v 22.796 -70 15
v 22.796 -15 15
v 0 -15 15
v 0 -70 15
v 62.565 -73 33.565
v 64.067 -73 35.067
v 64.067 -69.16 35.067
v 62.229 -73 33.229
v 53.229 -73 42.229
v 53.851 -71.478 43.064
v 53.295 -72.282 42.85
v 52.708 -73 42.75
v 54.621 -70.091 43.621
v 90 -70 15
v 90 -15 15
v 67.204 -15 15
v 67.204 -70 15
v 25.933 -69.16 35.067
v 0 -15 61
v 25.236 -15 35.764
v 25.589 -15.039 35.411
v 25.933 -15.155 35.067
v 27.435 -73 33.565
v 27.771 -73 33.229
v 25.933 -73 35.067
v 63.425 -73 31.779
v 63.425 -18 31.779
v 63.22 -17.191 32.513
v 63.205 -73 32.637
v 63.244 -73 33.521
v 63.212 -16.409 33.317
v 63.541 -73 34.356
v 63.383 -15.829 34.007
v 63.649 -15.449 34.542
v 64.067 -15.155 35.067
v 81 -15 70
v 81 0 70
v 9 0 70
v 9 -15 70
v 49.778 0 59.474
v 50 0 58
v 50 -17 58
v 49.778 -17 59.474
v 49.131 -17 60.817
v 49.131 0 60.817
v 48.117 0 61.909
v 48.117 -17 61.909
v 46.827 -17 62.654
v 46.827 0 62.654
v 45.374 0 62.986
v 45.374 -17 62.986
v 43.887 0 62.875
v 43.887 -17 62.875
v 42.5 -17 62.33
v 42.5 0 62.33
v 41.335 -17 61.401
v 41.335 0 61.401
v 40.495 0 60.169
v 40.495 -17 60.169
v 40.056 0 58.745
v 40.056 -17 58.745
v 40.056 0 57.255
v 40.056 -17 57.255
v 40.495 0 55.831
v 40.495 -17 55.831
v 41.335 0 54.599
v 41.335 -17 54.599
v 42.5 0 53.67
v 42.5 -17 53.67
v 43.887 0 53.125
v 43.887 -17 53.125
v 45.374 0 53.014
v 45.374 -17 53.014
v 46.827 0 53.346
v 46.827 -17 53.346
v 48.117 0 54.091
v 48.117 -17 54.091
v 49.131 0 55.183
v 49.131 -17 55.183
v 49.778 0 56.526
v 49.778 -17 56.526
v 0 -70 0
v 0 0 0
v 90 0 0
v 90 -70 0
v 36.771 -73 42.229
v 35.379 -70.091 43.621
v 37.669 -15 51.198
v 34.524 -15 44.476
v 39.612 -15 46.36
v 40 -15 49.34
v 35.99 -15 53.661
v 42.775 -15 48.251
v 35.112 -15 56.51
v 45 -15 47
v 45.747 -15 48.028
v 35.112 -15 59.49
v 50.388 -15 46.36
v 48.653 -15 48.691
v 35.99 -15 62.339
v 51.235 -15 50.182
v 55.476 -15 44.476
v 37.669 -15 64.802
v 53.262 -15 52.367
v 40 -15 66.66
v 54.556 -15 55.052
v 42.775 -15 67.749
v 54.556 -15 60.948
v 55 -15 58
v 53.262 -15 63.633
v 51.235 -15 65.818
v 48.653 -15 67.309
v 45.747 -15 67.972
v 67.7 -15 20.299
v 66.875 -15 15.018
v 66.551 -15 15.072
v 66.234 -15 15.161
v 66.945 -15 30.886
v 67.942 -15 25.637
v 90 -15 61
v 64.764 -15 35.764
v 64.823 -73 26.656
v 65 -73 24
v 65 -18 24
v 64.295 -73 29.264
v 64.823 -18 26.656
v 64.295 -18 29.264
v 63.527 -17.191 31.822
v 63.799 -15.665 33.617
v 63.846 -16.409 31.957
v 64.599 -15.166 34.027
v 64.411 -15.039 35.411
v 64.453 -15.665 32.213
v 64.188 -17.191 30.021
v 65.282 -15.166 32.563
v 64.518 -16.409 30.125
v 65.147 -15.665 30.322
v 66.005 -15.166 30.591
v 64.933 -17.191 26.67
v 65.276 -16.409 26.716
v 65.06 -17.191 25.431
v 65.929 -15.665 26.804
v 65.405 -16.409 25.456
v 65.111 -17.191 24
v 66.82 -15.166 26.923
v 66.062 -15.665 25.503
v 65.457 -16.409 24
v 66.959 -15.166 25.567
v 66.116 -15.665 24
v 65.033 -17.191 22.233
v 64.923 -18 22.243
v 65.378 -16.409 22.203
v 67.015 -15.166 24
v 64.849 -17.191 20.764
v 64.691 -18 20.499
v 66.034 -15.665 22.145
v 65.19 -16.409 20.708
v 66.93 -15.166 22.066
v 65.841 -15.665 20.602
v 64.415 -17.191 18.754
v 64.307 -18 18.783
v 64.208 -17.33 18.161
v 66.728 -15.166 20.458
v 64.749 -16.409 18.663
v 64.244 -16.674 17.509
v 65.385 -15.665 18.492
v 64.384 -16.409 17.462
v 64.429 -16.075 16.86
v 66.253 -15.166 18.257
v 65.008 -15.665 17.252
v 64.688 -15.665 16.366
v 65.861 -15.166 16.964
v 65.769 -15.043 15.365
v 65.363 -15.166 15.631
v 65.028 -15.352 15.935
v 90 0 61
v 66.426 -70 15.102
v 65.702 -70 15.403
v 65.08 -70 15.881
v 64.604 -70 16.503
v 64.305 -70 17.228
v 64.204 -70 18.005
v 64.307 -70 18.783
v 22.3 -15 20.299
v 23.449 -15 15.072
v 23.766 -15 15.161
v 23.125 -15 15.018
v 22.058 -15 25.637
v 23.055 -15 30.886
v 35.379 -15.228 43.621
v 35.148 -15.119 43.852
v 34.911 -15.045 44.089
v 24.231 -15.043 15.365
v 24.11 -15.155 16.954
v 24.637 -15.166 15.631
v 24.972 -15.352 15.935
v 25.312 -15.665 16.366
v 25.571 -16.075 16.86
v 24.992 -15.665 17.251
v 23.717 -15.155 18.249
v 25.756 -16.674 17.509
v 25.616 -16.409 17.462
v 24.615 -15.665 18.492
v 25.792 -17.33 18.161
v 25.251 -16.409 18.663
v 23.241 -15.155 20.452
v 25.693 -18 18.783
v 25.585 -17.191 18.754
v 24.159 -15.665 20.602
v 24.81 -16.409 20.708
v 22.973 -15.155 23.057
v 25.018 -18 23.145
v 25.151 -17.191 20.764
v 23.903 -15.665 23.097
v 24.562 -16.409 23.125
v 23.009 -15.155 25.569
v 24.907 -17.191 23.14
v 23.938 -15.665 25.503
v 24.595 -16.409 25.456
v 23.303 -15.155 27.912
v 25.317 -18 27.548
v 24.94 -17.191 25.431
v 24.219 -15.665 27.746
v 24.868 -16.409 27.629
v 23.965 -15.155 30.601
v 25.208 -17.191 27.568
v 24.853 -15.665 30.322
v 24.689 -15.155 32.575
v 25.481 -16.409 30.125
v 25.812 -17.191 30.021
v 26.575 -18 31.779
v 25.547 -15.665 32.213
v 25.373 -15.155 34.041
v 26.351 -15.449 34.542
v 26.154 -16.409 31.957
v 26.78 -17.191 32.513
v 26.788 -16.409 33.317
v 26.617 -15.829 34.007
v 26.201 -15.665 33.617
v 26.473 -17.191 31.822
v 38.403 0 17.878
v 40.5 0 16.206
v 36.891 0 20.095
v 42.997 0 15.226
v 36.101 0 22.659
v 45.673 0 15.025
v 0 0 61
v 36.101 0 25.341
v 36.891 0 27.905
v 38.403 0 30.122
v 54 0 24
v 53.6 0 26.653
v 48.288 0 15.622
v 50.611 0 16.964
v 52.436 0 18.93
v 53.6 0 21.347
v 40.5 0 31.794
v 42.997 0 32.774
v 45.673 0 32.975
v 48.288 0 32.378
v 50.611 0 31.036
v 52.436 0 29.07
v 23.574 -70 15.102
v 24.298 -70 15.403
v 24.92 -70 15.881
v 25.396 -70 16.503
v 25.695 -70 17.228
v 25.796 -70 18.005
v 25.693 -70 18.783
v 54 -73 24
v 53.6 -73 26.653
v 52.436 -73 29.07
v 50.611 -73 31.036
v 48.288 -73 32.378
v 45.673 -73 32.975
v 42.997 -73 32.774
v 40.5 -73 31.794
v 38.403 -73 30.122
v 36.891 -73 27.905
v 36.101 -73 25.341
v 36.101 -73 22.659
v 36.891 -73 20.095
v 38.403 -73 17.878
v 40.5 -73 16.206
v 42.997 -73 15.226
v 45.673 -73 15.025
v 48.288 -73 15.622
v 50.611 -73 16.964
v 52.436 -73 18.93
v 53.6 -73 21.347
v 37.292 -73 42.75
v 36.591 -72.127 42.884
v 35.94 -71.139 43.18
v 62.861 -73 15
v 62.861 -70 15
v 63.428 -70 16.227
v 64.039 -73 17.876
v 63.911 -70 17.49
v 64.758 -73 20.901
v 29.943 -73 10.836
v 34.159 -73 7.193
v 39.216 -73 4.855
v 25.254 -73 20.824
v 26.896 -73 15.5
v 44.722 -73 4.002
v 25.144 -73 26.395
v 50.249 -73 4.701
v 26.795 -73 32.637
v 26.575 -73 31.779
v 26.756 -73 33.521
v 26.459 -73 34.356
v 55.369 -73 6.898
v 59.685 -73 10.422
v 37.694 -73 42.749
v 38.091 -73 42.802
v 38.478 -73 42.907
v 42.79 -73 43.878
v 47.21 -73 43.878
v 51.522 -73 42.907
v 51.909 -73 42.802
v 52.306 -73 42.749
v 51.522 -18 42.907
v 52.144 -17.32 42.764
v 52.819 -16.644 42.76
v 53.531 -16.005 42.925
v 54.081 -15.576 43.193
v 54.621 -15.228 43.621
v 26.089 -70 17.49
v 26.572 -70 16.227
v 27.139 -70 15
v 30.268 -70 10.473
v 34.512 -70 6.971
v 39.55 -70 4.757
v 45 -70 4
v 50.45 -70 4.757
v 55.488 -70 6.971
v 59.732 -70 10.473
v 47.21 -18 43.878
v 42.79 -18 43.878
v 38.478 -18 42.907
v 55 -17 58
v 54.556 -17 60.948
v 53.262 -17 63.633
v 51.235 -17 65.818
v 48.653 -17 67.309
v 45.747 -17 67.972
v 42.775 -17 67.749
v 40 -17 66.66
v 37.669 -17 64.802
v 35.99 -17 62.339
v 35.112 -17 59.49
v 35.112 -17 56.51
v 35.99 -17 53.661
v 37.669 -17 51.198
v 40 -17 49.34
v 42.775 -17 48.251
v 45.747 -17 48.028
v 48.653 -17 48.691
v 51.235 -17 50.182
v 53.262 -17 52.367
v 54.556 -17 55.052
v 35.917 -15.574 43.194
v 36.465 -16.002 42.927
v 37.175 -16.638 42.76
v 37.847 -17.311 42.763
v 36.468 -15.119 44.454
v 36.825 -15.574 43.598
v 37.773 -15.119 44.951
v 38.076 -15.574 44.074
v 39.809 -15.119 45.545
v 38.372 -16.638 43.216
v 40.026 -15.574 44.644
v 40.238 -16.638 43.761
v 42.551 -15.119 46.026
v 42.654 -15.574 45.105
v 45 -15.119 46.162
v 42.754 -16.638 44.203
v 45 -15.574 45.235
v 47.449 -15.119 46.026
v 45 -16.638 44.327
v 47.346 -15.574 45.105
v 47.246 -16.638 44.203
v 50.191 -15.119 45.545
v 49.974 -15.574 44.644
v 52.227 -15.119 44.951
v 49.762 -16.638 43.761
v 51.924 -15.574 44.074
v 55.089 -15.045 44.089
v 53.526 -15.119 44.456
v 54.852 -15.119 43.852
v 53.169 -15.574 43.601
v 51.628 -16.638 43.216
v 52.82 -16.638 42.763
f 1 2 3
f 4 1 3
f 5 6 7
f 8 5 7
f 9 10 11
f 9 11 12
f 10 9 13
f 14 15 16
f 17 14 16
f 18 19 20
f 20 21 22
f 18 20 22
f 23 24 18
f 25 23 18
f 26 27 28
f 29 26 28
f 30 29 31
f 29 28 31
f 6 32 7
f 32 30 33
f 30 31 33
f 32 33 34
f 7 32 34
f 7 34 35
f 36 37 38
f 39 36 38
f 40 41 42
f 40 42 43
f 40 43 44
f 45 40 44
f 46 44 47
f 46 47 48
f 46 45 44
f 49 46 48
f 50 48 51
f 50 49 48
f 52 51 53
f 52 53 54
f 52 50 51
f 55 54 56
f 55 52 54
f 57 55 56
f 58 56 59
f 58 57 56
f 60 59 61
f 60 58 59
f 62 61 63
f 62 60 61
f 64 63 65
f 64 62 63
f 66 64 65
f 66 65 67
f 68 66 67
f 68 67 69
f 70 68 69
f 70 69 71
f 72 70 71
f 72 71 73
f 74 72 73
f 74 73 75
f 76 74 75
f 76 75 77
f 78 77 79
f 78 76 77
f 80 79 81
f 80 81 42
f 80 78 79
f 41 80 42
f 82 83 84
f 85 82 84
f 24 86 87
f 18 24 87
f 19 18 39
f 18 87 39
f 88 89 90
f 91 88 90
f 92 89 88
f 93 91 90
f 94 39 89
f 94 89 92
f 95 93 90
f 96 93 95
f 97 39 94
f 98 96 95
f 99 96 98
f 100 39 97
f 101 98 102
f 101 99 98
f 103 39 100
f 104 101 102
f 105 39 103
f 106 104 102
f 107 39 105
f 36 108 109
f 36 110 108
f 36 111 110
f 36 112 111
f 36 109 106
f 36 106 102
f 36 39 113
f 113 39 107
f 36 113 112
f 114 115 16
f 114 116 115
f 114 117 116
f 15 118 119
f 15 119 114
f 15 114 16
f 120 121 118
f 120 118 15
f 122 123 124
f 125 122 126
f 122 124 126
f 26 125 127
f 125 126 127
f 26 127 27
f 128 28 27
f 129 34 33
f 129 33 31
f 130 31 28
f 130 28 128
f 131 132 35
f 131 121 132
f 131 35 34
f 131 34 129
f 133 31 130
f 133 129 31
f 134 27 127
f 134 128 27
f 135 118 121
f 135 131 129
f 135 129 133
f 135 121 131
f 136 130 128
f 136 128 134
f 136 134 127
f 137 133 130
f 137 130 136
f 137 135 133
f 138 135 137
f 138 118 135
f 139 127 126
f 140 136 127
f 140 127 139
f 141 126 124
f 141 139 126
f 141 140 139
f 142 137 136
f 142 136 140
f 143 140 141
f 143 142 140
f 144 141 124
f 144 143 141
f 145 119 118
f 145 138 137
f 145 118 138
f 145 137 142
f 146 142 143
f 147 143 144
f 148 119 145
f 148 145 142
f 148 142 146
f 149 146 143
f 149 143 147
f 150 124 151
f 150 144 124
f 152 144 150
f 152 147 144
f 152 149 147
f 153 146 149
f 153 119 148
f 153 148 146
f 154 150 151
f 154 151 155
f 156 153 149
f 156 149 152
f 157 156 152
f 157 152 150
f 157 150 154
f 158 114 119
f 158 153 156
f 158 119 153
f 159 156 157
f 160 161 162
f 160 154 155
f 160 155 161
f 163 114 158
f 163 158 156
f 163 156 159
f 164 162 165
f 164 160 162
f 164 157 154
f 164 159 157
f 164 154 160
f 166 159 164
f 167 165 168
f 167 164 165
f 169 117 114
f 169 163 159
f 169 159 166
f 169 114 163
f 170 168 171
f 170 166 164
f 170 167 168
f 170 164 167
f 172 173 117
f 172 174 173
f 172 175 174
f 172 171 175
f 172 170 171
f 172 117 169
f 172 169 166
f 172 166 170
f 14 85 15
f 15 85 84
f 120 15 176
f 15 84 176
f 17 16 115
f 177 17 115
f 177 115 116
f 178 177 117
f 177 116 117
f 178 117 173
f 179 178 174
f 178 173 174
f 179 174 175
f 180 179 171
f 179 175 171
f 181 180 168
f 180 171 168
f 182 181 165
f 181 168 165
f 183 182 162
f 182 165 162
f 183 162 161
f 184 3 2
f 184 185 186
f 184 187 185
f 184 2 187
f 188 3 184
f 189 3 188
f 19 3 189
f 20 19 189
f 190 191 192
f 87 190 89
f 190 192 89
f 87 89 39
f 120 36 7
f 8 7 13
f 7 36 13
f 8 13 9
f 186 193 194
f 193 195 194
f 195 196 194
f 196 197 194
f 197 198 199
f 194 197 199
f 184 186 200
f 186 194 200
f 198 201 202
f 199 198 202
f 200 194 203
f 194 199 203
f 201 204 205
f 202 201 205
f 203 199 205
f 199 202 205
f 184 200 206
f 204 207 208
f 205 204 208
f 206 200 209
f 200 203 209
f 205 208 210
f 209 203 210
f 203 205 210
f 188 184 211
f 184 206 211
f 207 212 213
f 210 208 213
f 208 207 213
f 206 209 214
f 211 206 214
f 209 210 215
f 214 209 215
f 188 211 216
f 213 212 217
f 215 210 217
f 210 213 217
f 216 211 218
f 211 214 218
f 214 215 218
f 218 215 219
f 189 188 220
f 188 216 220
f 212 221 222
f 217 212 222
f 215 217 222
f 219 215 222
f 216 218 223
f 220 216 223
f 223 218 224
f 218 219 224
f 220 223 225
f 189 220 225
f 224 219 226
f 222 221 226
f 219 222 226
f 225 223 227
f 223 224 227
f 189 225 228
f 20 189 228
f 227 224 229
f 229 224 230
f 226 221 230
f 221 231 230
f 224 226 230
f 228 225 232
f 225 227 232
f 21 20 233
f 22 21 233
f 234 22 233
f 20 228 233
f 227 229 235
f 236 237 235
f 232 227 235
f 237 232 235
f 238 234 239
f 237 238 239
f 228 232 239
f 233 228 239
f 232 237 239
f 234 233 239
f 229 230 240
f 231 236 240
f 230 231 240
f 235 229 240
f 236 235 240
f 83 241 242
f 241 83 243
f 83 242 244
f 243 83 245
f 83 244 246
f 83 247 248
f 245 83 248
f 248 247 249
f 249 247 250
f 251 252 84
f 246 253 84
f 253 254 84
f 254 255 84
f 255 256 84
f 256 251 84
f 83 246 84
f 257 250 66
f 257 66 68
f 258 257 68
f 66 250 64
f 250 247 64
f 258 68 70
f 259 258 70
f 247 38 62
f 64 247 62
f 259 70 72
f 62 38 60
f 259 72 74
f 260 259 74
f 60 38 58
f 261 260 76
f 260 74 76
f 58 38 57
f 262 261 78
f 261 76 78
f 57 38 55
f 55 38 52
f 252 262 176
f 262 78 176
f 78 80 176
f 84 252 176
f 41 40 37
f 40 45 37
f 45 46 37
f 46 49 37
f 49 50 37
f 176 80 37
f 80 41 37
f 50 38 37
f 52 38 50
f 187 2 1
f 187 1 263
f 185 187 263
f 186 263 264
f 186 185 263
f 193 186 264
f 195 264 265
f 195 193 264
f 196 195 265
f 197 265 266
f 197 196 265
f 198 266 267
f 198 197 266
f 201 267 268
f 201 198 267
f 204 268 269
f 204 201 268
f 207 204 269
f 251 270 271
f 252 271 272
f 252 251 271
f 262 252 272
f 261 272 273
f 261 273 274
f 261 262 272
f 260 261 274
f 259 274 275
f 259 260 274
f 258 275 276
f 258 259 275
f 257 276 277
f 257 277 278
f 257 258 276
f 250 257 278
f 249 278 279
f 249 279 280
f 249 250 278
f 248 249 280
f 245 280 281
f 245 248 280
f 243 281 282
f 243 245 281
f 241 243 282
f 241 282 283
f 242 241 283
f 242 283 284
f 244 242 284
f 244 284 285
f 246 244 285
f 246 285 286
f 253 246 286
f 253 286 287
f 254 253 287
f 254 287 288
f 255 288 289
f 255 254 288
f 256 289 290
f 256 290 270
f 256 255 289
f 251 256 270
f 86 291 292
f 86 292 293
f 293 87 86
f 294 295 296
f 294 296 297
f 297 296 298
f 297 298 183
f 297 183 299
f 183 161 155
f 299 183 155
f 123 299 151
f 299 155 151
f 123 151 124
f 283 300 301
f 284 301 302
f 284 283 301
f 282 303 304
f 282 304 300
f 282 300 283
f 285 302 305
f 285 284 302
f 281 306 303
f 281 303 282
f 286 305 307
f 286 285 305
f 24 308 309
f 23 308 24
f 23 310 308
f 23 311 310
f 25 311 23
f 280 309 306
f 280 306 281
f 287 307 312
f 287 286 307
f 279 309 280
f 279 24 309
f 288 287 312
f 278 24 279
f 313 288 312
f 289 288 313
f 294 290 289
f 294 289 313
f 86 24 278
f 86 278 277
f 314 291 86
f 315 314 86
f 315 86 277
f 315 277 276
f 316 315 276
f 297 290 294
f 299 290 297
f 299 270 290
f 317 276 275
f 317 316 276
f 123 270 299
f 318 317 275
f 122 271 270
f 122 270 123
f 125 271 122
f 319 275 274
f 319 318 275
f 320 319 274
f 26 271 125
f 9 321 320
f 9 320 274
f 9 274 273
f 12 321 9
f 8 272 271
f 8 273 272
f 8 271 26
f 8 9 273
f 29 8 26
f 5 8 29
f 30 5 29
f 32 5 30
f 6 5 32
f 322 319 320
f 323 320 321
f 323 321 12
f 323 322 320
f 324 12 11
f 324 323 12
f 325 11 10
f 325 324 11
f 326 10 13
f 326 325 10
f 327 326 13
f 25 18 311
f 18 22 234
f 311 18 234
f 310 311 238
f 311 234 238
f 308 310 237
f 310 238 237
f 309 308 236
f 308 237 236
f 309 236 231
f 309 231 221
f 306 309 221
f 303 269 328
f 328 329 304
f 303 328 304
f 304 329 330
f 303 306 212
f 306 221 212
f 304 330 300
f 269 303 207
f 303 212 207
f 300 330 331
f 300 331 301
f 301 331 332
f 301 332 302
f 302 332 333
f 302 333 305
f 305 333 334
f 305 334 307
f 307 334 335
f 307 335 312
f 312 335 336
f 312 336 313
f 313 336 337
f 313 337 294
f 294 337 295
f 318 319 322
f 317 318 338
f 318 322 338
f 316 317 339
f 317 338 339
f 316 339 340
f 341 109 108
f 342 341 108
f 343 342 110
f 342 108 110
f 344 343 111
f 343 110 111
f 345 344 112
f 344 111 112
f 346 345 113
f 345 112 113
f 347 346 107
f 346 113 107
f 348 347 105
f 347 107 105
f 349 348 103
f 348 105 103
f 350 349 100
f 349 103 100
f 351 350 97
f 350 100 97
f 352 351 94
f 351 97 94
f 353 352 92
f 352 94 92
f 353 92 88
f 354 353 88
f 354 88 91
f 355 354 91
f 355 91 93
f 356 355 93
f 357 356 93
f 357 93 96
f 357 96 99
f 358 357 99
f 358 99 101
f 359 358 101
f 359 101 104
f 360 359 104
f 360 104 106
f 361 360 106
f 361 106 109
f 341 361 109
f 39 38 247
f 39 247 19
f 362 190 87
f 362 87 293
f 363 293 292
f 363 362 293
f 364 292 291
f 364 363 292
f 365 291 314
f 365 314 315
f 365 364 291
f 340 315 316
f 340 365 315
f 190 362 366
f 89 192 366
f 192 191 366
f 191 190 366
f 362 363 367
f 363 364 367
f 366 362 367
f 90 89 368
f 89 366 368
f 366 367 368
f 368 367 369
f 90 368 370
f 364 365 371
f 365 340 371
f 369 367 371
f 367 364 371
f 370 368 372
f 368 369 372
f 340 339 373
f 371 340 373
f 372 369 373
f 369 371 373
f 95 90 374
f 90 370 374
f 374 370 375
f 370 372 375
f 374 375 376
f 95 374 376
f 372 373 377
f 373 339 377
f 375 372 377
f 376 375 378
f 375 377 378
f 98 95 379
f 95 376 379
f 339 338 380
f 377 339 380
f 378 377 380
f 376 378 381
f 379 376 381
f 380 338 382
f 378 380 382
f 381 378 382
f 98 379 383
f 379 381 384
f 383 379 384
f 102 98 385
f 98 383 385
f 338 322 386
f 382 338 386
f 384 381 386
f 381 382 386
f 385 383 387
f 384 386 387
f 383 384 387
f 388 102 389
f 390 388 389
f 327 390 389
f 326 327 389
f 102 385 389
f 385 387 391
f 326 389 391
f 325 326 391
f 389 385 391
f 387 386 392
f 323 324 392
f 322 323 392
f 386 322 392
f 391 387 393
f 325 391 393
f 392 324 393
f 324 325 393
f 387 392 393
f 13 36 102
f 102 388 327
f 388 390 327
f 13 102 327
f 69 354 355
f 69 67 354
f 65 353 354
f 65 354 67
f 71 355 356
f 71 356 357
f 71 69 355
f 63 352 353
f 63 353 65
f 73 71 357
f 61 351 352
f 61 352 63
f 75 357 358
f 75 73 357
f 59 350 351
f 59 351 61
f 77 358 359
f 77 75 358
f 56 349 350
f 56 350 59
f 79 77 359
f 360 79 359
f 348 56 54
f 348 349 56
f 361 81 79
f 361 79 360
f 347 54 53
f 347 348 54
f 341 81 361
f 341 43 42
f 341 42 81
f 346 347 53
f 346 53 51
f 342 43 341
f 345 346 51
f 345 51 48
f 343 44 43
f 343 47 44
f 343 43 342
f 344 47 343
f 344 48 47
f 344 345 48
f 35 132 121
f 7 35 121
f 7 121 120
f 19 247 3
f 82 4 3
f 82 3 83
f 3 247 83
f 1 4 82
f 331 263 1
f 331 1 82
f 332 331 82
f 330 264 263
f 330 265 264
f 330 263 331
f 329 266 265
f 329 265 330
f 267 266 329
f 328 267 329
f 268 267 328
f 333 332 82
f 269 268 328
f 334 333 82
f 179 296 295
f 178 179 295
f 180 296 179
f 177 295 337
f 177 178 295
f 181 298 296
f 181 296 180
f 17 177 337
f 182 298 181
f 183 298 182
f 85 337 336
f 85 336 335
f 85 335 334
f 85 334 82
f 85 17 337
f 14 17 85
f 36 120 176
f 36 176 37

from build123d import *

# Parameters (mm, degrees)
F0_R          = 10
F1_DEPTH      = 15
F2_DEPTH      = 70
F0_R_2        = 9
F3_DEPTH      = 73
F0_R_3        = 5
F4_DEPTH      = 17
F5_SIZE2      = 9
F5_SIZE       = 9
F7_DEPTH      = 58
F9_DEPTH      = 12.7279220614
F11_DEPTH     = 12.7279220614
F12_T1_DEPTH  = 65.8575805292
F12_T6_DEPTH  = 62.9239144665
F12_T11_DEPTH = 62.9239144665
F12_T14_ANGLE = 91.5672431693
F12_T16_ANGLE = 98.292097676
F12_T18_ANGLE = 98.292097676
F12_T22_DEPTH = 67.925124519
F12_T28_DEPTH = 62.6117965858
F12_T35_DEPTH = 62.6117965858
F12_T42_DEPTH = 67.925124519
F12_T48_DEPTH = 62.6117965858
F12_T55_DEPTH = 62.6117965858


# Not quite as in the source:
# - a fillet or chamfer that OpenCascade refuses, or shapes differently, is made with other operations: its cross-section is extruded or revolved along the edge and cut away or added


with BuildPart() as f1:
    # F0 (on Front) → F1 (new body)
    with BuildSketch(Plane.XZ):
        with BuildLine():
            Line((0, 70), (0, 15))
            Line((0, 15), (27.1394289005, 15))
            ThreePointArc((27.1394289005, 15), (40.3746039083, 43.4577930659), (65, 24))
            ThreePointArc((65, 24), (64.4577930659, 19.3746039083), (62.8605710995, 15))
            Line((62.8605710995, 15), (90, 15))
            Line((90, 15), (90, 70))
            Line((90, 70), (0, 70))
        make_face()
        with Locations((45, 58)):
            Circle(F0_R, mode=Mode.SUBTRACT)
    extrude(amount=F1_DEPTH)

    # F0 (on Front) → F2 (join)
    with BuildSketch(Plane.XZ):
        with BuildLine():
            Line((0, 15), (0, 0))
            Line((0, 0), (90, 0))
            Line((90, 0), (90, 15))
            Line((90, 15), (62.8605710995, 15))
            ThreePointArc((62.8605710995, 15), (45, 4), (27.1394289005, 15))
            Line((27.1394289005, 15), (0, 15))
        make_face()
    extrude(amount=F2_DEPTH)

    # F0 (on Front) → F3 (join)
    with BuildSketch(Plane.XZ):
        with BuildLine():
            ThreePointArc((65, 24), (40.3746039083, 43.4577930659), (27.1394289005, 15))
            ThreePointArc((27.1394289005, 15), (45, 4), (62.8605710995, 15))
            ThreePointArc((62.8605710995, 15), (64.4577930659, 19.3746039083), (65, 24))
        make_face()
        with Locations((45, 24)):
            Circle(F0_R_2, mode=Mode.SUBTRACT)
    extrude(amount=F3_DEPTH)

    # F0 (on Front) → F4 (join)
    with BuildSketch(Plane.XZ):
        with Locations((45, 58)):
            Circle(F0_R)
        with Locations((45, 58)):
            Circle(F0_R_3, mode=Mode.SUBTRACT)
    extrude(amount=F4_DEPTH)

    # F5
    f5_edges = [f1.edges().sort_by_distance(p)[0] for p in [
        (90, -7.5, 70),
        (0, -7.5, 70),
    ]]
    chamfer(f5_edges, length=F5_SIZE, length2=F5_SIZE2)

    # F6 (on face) → F7 (join, through all)
    with BuildSketch(Plane.XZ.offset(15)):
        with BuildLine():
            Line((90, 61), (81, 70))
            Line((81, 70), (53.2287565553, 42.2287565553))
            ThreePointArc((53.2287565553, 42.2287565553), (58.60484202, 38.659750121), (62.5646599663, 33.5646599663))
            Line((62.5646599663, 33.5646599663), (90, 61))
        make_face()
        with BuildLine():
            Line((36.7712434447, 42.2287565553), (9, 70))
            Line((9, 70), (0, 61))
            Line((0, 61), (27.4353400337, 33.5646599663))
            ThreePointArc((27.4353400337, 33.5646599663), (31.39515798, 38.659750121), (36.7712434447, 42.2287565553))
        make_face()
    extrude(amount=F7_DEPTH)

    # F8 (on face) → F9 (cut, through all)
    with BuildSketch(Plane(origin=(5.5, 0, -5.5), x_dir=(0, -1, 0), z_dir=(-0.7071067812, 0, 0.7071067812))):
        Polygon((73, 67.4986548357), (73, 106.7731239592), (15, 106.7731239592), align=None)
    extrude(amount=-F9_DEPTH, mode=Mode.SUBTRACT)

    # F10 (on face) → F11 (cut, through all)
    with BuildSketch(Plane(origin=(39.5, 0, 39.5), x_dir=(0, 1, 0), z_dir=(0.7071067812, 0, 0.7071067812))):
        Polygon((-73, 3.859044529), (-15, 43.1335136524), (-73, 43.1335136524), align=None)
    extrude(amount=-F11_DEPTH, mode=Mode.SUBTRACT)

    # F12: fillet of radius 3 on 9 edges, made by hand

    # F12_s2 → F12_t1 (join)
    with BuildSketch(Plane.XZ.offset(4.1424194708)):
        with BuildLine():
            ThreePointArc((67.2036033112, 15), (64.821605611, 16.1762437234), (64.3074811402, 18.7826086957))
            ThreePointArc((64.3074811402, 18.7826086957), (63.6800176381, 16.8545860133), (62.8605710995, 15))
            Line((62.8605710995, 15), (67.2036033112, 15))
        make_face()
        with BuildLine():
            ThreePointArc((22.7963966888, 15), (25.178394389, 16.1762437234), (25.6925188598, 18.7826086957))
            ThreePointArc((25.6925188598, 18.7826086957), (26.3199823619, 16.8545860133), (27.1394289005, 15))
            Line((27.1394289005, 15), (22.7963966888, 15))
        make_face()
    extrude(amount=F12_T1_DEPTH)


with BuildPart() as f12_tool4:
    # F12_s5 → F12_t6 (new body)
    with BuildSketch(Plane.XZ.offset(10.0760855335)):
        with BuildLine():
            ThreePointArc((35.378550121, 43.621449879), (36.8258280598, 42.8194729683), (38.47814823, 42.9067567153))
            ThreePointArc((38.47814823, 42.9067567153), (37.6169090114, 42.5873604219), (36.7712434447, 42.2287565553))
            Line((36.7712434447, 42.2287565553), (35.378550121, 43.621449879))
        make_face()
    extrude(amount=F12_T6_DEPTH)

    split(bisect_by=Plane(origin=(-25.8358090511, -24.7411221638, 25.8358090511), x_dir=(-0.6916401802, 0.7222422455, 0), z_dir=(0.5855012217, 0.5606929988, -0.5855012217)), keep=Keep.TOP)


with BuildPart() as f1_1:
    add(f1.part)

    # F12_t3: union F12_tool4
    add(f12_tool4.part)


with BuildPart() as f12_tool9:
    # F12_s10 → F12_t11 (new body)
    with BuildSketch(Plane.XZ.offset(10.0760855335)):
        with BuildLine():
            ThreePointArc((51.52185177, 42.9067567153), (53.1741719402, 42.8194729683), (54.621449879, 43.621449879))
            Line((54.621449879, 43.621449879), (53.2287565553, 42.2287565553))
            ThreePointArc((53.2287565553, 42.2287565553), (52.3830909886, 42.5873604219), (51.52185177, 42.9067567153))
        make_face()
    extrude(amount=F12_T11_DEPTH)

    split(bisect_by=Plane(origin=(56.6888603025, -54.2869013815, 56.6888603025), x_dir=(-0.6916401802, -0.7222422455, 0), z_dir=(-0.5855012217, 0.5606929988, -0.5855012217)), keep=Keep.TOP)


with BuildPart() as f1_2:
    add(f1_1.part)

    # F12_t8: union F12_tool9
    add(f12_tool9.part)

    # F12_s13 → F12_t14 (revolve)
    with BuildSketch(Plane(origin=(33.8801327713, 0, 34.8197847954), x_dir=(0, 1, 0), z_dir=(-0.6973700085, 0, -0.7167112886))):
        with BuildLine():
            ThreePointArc((-15, -7.4848722144), (-15.8786796564, -5.3635518709), (-18, -4.4848722144))
            Line((-18, -4.4848722144), (-15, -4.4848722144))
            Line((-15, -4.4848722144), (-15, -7.4848722144))
        make_face()
    revolve(axis=Axis((45, -15, 24), (0, 1, 0)), revolution_arc=F12_T14_ANGLE)

    # F12_s15 → F12_t16 (revolve)
    with BuildSketch(Plane(origin=(14.639534214, 0, -12.2582579265), x_dir=(0, 1, 0), z_dir=(-0.7667085967, 0, 0.6419952708))):
        with BuildLine():
            ThreePointArc((-18, -67.2907935079), (-15.8786796564, -68.1694731643), (-15, -70.2907935079))
            Line((-15, -70.2907935079), (-15, -67.2907935079))
            Line((-15, -67.2907935079), (-18, -67.2907935079))
        make_face()
    revolve(axis=Axis((45, -15, 24), (0, 1, 0)), revolution_arc=F12_T16_ANGLE)

    # F12_s17 → F12_t18 (revolve)
    with BuildSketch(Plane(origin=(13.1100245291, 0, -11.708191847), x_dir=(0, 1, 0), z_dir=(0.7458581541, 0, -0.666104807))):
        with BuildLine():
            ThreePointArc((-15, 24.8753120149), (-15.8786796564, 26.9966323584), (-18, 27.8753120149))
            Line((-18, 27.8753120149), (-15, 27.8753120149))
            Line((-15, 27.8753120149), (-15, 24.8753120149))
        make_face()
    revolve(axis=Axis((45, -15, 24), (0, 1, 0)), revolution_arc=F12_T18_ANGLE)


with BuildPart() as f12_tool20:
    # F12_s21 → F12_t22 (new body)
    with BuildSketch(Plane.XZ.offset(9.6866720668)):
        with BuildLine():
            ThreePointArc((25.9325039488, 35.0674960512), (26.7555146188, 33.5214277242), (26.5749422655, 31.779283224))
            ThreePointArc((26.5749422655, 31.779283224), (26.9830125278, 32.6826356843), (27.4353400337, 33.5646599663))
            Line((27.4353400337, 33.5646599663), (25.9325039488, 35.0674960512))
        make_face()
    extrude(amount=F12_T22_DEPTH)

    split(bisect_by=Plane.XZ.offset(15), keep=Keep.BOTTOM)

    split(bisect_by=Plane(origin=(30.5, 0, 30.5), x_dir=(0, 1, 0), z_dir=(-0.7071067812, 0, -0.7071067812)), keep=Keep.TOP)


with BuildPart() as f1_3:
    add(f1_2.part)

    # F12_t19: union F12_tool20
    add(f12_tool20.part)


with BuildPart() as f12_tool26:
    # F12_s27 → F12_t28 (new body)
    with BuildSketch(Plane.XZ.offset(15)):
        with BuildLine():
            ThreePointArc((25.9325039488, 35.0674960512), (26.7555146188, 33.5214277242), (26.5749422655, 31.779283224))
            ThreePointArc((26.5749422655, 31.779283224), (26.9830125278, 32.6826356843), (27.4353400337, 33.5646599663))
            Line((27.4353400337, 33.5646599663), (25.9325039488, 35.0674960512))
        make_face()
    extrude(amount=F12_T28_DEPTH)

    split(bisect_by=Plane(origin=(-25.8358090511, -24.7411221638, 25.8358090511), x_dir=(-0.6916401802, 0.7222422455, 0), z_dir=(0.5855012217, 0.5606929988, -0.5855012217)), keep=Keep.TOP)

    split(bisect_by=Plane(origin=(30.5, 0, 30.5), x_dir=(0, 1, 0), z_dir=(-0.7071067812, 0, -0.7071067812)), keep=Keep.TOP)

    split(bisect_by=Plane.XZ.offset(73), keep=Keep.BOTTOM)


with BuildPart() as f1_4:
    add(f1_3.part)

    # F12_t25: union F12_tool26
    add(f12_tool26.part)


with BuildPart() as f12_tool33:
    # F12_s34 → F12_t35 (new body)
    with BuildSketch(Plane.XZ.offset(15)):
        with BuildLine():
            ThreePointArc((25.9325039488, 35.0674960512), (26.7555146188, 33.5214277242), (26.5749422655, 31.779283224))
            ThreePointArc((26.5749422655, 31.779283224), (26.9830125278, 32.6826356843), (27.4353400337, 33.5646599663))
            Line((27.4353400337, 33.5646599663), (25.9325039488, 35.0674960512))
        make_face()
    extrude(amount=F12_T35_DEPTH)

    split(bisect_by=Plane(origin=(-25.8358090511, -24.7411221638, 25.8358090511), x_dir=(0.6916401802, -0.7222422455, 0), z_dir=(-0.5855012217, -0.5606929988, 0.5855012217)), keep=Keep.TOP)

    split(bisect_by=Plane(origin=(30.5, 0, 30.5), x_dir=(0, 1, 0), z_dir=(-0.7071067812, 0, -0.7071067812)), keep=Keep.TOP)

    split(bisect_by=Plane.XZ.offset(73), keep=Keep.BOTTOM)


with BuildPart() as f1_5:
    add(f1_4.part)

    # F12_t32: union F12_tool33
    add(f12_tool33.part)


with BuildPart() as f12_tool40:
    # F12_s41 → F12_t42 (new body)
    with BuildSketch(Plane.XZ.offset(9.6866720668)):
        with BuildLine():
            ThreePointArc((63.4250577345, 31.779283224), (63.2444853812, 33.5214277242), (64.0674960512, 35.0674960512))
            Line((64.0674960512, 35.0674960512), (62.5646599663, 33.5646599663))
            ThreePointArc((62.5646599663, 33.5646599663), (63.0169874722, 32.6826356843), (63.4250577345, 31.779283224))
        make_face()
    extrude(amount=F12_T42_DEPTH)

    split(bisect_by=Plane(origin=(14.5, 0, -14.5), x_dir=(0, 1, 0), z_dir=(0.7071067812, 0, -0.7071067812)), keep=Keep.TOP)

    split(bisect_by=Plane.XZ.offset(15), keep=Keep.BOTTOM)


with BuildPart() as f1_6:
    add(f1_5.part)

    # F12_t39: union F12_tool40
    add(f12_tool40.part)


with BuildPart() as f12_tool46:
    # F12_s47 → F12_t48 (new body)
    with BuildSketch(Plane.XZ.offset(15)):
        with BuildLine():
            ThreePointArc((63.4250577345, 31.779283224), (63.2444853812, 33.5214277242), (64.0674960512, 35.0674960512))
            Line((64.0674960512, 35.0674960512), (62.5646599663, 33.5646599663))
            ThreePointArc((62.5646599663, 33.5646599663), (63.0169874722, 32.6826356843), (63.4250577345, 31.779283224))
        make_face()
    extrude(amount=F12_T48_DEPTH)

    split(bisect_by=Plane.XZ.offset(73), keep=Keep.BOTTOM)

    split(bisect_by=Plane(origin=(14.5, 0, -14.5), x_dir=(0, 1, 0), z_dir=(0.7071067812, 0, -0.7071067812)), keep=Keep.TOP)

    split(bisect_by=Plane(origin=(56.6888603025, -54.2869013815, 56.6888603025), x_dir=(-0.6916401802, -0.7222422455, 0), z_dir=(-0.5855012217, 0.5606929988, -0.5855012217)), keep=Keep.TOP)


with BuildPart() as f1_7:
    add(f1_6.part)

    # F12_t45: union F12_tool46
    add(f12_tool46.part)


with BuildPart() as f12_tool53:
    # F12_s54 → F12_t55 (new body)
    with BuildSketch(Plane.XZ.offset(15)):
        with BuildLine():
            ThreePointArc((63.4250577345, 31.779283224), (63.2444853812, 33.5214277242), (64.0674960512, 35.0674960512))
            Line((64.0674960512, 35.0674960512), (62.5646599663, 33.5646599663))
            ThreePointArc((62.5646599663, 33.5646599663), (63.0169874722, 32.6826356843), (63.4250577345, 31.779283224))
        make_face()
    extrude(amount=F12_T55_DEPTH)

    split(bisect_by=Plane.XZ.offset(73), keep=Keep.BOTTOM)

    split(bisect_by=Plane(origin=(14.5, 0, -14.5), x_dir=(0, 1, 0), z_dir=(0.7071067812, 0, -0.7071067812)), keep=Keep.TOP)

    split(bisect_by=Plane(origin=(56.6888603025, -54.2869013815, 56.6888603025), x_dir=(0.6916401802, 0.7222422455, 0), z_dir=(0.5855012217, -0.5606929988, 0.5855012217)), keep=Keep.TOP)


with BuildPart() as f1_8:
    add(f1_7.part)

    # F12_t52: union F12_tool53
    add(f12_tool53.part)


solid = f1_8.part
